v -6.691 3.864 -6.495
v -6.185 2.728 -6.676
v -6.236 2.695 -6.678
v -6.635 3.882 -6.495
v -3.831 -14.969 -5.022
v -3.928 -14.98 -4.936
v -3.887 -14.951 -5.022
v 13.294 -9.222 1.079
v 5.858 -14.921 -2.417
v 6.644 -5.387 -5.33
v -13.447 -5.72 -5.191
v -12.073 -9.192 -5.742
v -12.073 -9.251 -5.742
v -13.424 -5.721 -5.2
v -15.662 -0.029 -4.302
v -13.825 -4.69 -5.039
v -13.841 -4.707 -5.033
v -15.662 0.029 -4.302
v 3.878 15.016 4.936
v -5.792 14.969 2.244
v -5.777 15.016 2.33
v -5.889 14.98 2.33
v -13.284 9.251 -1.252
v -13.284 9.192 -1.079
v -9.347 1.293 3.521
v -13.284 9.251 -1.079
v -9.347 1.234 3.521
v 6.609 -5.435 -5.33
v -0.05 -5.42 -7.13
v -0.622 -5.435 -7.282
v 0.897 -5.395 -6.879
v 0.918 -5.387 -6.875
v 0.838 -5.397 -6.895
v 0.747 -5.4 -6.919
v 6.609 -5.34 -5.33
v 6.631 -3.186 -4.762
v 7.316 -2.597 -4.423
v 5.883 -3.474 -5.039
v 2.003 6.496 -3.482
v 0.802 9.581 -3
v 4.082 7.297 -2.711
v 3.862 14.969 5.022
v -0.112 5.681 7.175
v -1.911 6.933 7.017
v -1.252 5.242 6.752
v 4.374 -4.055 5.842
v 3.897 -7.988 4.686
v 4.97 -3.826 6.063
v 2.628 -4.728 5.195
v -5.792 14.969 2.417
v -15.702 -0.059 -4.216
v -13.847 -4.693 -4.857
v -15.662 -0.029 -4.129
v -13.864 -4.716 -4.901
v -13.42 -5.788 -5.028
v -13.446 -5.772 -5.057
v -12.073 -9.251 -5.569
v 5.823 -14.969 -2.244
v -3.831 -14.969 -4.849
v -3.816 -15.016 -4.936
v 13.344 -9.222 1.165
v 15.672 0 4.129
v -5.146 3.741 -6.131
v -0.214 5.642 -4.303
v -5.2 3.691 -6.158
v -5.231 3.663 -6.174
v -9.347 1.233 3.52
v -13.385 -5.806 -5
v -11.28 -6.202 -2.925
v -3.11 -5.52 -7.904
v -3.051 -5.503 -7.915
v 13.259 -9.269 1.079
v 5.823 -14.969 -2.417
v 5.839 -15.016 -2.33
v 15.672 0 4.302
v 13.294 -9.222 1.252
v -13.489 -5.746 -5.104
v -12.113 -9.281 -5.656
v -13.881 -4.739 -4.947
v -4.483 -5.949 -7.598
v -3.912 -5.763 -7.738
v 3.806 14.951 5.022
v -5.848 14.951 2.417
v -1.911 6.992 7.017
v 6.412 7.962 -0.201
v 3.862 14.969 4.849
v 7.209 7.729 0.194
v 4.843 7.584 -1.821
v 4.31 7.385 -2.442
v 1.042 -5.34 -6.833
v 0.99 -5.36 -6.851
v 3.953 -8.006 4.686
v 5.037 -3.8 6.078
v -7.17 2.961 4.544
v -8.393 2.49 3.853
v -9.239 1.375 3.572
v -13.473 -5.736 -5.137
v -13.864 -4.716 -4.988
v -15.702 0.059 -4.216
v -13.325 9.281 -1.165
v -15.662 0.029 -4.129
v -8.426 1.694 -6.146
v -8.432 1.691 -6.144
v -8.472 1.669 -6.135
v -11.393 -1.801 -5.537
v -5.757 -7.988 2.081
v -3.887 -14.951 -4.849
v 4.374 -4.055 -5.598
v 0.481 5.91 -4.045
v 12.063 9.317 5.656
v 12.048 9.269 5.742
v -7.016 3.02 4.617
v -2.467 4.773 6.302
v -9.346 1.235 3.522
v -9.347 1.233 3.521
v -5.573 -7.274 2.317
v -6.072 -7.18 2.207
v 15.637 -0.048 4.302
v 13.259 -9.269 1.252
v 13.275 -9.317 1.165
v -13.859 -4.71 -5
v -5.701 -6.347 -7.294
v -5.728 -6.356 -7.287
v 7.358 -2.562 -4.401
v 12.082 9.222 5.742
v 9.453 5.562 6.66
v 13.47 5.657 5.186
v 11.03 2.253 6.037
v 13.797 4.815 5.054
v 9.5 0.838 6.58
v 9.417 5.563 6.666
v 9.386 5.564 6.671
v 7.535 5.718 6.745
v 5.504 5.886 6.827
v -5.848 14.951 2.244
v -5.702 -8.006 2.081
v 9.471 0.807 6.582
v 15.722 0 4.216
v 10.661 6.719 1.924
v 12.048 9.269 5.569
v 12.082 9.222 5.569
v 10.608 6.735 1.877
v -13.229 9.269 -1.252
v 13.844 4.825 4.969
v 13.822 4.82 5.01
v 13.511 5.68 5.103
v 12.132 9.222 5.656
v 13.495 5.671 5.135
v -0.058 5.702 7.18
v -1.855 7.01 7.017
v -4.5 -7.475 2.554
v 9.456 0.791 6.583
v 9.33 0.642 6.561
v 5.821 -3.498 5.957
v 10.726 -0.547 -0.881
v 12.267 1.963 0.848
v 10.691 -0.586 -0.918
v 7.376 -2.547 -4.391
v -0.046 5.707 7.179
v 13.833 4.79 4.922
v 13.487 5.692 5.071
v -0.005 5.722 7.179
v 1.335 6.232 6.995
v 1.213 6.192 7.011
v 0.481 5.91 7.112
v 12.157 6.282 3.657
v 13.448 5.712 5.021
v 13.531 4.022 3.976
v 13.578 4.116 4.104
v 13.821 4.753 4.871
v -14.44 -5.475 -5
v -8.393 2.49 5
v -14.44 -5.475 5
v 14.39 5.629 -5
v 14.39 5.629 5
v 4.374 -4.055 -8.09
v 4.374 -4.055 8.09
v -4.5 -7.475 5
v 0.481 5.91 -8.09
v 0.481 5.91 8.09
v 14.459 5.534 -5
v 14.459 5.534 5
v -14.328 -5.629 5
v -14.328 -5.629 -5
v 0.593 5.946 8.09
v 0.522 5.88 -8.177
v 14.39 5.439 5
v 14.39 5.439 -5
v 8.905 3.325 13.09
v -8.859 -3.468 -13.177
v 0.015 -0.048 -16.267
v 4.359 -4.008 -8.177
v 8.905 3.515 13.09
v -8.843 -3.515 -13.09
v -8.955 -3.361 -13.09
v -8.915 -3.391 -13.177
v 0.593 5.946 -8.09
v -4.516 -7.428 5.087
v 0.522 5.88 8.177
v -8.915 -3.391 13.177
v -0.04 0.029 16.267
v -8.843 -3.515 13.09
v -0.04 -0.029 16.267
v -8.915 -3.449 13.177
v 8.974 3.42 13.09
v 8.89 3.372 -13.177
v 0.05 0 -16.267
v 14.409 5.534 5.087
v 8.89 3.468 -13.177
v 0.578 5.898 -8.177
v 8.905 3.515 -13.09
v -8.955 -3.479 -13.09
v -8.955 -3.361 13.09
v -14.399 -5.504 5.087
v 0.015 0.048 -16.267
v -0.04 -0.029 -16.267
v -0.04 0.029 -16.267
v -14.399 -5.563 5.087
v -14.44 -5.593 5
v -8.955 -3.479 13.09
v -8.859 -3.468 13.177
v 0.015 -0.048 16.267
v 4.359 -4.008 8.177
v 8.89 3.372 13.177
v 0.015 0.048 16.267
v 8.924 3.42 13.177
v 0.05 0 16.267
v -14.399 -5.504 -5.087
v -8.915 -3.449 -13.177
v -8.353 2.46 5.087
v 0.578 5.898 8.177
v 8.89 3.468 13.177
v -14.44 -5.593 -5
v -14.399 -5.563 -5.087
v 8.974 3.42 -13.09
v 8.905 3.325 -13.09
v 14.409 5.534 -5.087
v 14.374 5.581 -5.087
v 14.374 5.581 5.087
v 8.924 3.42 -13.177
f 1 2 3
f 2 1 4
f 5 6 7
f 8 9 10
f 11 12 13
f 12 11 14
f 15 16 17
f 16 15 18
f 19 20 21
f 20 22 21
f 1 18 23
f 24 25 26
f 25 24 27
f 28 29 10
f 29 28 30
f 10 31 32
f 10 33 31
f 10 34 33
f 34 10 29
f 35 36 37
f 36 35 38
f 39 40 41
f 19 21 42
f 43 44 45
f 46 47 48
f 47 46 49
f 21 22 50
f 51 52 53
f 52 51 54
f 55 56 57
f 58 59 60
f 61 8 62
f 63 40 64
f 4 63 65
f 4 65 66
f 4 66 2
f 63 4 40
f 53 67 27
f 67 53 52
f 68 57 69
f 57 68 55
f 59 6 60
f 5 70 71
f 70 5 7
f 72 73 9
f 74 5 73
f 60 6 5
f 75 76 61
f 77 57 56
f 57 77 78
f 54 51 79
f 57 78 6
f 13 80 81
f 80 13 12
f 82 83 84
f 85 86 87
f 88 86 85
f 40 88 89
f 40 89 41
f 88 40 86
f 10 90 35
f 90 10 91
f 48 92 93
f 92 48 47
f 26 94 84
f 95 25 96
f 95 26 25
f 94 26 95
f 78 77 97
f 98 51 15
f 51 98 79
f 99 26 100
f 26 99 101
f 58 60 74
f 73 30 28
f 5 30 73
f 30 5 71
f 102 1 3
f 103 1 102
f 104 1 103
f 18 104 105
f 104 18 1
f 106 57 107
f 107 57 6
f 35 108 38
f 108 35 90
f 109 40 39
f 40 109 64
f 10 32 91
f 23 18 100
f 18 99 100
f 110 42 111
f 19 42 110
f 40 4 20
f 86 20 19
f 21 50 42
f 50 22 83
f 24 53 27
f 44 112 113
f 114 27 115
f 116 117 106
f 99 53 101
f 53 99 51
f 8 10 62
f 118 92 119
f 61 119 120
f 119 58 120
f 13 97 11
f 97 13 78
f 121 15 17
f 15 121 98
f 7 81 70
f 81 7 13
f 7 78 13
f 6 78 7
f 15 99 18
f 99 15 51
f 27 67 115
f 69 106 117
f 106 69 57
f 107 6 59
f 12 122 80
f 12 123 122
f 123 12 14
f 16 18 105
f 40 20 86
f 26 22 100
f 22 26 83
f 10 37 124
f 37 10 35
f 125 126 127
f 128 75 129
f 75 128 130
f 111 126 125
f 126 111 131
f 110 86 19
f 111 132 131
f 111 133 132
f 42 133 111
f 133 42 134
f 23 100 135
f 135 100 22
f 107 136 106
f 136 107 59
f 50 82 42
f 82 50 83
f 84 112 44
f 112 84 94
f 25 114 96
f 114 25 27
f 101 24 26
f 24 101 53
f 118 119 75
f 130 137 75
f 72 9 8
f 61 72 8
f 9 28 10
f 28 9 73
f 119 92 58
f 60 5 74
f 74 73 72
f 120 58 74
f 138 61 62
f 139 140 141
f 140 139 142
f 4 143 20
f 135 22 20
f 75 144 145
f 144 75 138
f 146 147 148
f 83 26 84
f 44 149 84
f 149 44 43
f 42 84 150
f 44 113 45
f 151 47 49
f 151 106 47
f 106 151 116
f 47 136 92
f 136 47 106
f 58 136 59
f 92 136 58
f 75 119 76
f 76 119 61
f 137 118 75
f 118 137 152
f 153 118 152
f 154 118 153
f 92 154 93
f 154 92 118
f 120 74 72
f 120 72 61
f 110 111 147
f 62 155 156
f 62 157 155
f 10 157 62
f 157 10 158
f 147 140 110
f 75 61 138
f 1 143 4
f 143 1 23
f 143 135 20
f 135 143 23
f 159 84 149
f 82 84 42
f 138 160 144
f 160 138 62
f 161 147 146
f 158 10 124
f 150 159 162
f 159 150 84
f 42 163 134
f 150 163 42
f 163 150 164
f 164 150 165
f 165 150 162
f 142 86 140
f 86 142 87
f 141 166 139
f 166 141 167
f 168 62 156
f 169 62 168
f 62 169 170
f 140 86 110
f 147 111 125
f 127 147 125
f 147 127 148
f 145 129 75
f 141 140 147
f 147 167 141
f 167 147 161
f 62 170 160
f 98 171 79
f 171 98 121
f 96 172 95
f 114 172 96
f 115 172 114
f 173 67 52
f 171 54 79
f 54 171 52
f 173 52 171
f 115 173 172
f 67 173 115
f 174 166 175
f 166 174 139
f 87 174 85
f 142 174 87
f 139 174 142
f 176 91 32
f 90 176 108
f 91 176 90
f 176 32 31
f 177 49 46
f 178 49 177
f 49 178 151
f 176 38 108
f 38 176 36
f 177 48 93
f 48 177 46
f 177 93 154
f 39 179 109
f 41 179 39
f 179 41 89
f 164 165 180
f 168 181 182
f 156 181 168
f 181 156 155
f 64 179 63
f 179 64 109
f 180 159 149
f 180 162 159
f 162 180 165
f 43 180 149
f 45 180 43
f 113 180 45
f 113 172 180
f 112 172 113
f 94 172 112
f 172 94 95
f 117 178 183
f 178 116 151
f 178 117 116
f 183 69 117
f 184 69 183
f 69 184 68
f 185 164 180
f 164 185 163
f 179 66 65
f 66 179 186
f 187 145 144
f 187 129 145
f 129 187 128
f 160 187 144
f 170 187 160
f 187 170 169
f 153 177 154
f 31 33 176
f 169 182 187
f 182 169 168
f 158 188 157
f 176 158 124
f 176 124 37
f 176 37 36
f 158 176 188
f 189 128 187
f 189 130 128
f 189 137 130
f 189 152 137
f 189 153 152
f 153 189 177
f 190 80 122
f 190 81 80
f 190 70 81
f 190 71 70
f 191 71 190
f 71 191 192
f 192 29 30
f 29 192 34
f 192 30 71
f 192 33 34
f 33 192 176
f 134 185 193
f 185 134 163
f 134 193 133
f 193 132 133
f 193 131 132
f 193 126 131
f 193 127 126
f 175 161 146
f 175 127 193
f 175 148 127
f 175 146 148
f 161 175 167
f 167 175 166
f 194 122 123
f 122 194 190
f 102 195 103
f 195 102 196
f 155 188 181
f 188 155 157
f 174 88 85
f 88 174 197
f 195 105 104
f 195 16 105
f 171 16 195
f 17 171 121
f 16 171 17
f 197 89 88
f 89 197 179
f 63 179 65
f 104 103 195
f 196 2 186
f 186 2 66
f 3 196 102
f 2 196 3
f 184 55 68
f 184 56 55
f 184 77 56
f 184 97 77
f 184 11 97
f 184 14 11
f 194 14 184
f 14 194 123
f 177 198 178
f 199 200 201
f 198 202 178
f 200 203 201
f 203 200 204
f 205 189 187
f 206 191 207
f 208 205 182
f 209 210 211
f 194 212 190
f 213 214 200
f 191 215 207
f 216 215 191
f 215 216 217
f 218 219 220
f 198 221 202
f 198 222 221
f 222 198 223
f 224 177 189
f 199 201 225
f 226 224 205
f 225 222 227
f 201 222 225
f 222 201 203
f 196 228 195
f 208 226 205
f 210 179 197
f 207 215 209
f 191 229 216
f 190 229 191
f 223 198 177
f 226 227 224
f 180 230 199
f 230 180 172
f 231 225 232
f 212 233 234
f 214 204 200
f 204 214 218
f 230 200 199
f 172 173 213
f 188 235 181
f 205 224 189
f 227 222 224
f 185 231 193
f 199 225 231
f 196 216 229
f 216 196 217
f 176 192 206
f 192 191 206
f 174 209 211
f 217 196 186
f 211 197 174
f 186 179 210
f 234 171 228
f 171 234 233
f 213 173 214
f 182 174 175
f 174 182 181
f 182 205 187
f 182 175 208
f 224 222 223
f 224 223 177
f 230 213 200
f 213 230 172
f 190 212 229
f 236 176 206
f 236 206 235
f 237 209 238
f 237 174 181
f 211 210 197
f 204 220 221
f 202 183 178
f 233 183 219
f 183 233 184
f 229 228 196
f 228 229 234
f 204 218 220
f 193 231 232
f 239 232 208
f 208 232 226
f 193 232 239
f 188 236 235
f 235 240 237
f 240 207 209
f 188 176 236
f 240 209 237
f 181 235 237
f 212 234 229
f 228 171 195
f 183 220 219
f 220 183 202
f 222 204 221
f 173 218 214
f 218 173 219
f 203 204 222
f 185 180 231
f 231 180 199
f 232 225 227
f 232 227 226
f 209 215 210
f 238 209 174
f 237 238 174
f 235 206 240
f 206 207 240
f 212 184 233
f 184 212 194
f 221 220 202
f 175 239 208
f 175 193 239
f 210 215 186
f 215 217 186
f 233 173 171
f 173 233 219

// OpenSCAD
// Auto-generated OpenSCAD file

    inner_points = 10*[[1.4359011870482463, 0.5533730837177137, -0.5000000000000805], [-1.4359011870482463, -0.5533730837177137, 0.5000000000000805], [0.8874357380822848, 0.34200337419673843, 1.3090169943748977], [1.483420692140161e-13, -1.4966410443445797e-13, 1.618033988749895], [-1.483420692140161e-13, 1.4966410443445797e-13, -1.618033988749895], [-0.8874357380822848, -0.34200337419673843, -1.3090169943748977], [1.4359011870483378, 0.5533730837176212, 0.4999999999999195], [-0.887435738082045, -0.3420033741969806, 1.3090169943749972], [0.887435738082045, 0.3420033741969806, -1.3090169943749972], [-1.4359011870483378, -0.5533730837176212, -0.4999999999999195], [0.05622638989055023, 0.5850898186537883, 0.8090169943749964], [0.434336020988879, -0.39603500310477363, 0.809016994374871], [0.6046918388566034, 0.7964595281746711, 1.8207657603852567e-14], [0.9828014699549321, -0.18466529358389083, -1.0721978860317449e-13], [-0.8312093481916429, 0.2430864444569574, 0.5000000000000987], [-0.45309971709331415, -0.7380383773016045, 0.49999999999997324], [0.05622638989040191, 0.5850898186539379, -0.8090169943748985], [0.4343360209887307, -0.3960350031046239, -0.809016994375024], [-0.8312093481917346, 0.24308644445704983, -0.4999999999999013], [-0.4530997170934058, -0.738038377301512, -0.5000000000000268]];

    outer_points = 10*[[-1.562151832989105, 0.0, -0.42156332791014234], [1.562151832989105, 0.0, 0.42156332791014234], [-0.5807729208038567, 1.4921233423461835, 0.23303376243906446], [0.3846900075713595, 1.4921233423461835, 0.4935742274980496], [-0.3846900075713595, -1.4921233423461835, -0.4935742274980496], [0.5807729208038567, -1.4921233423461835, -0.23303376243906446], [-1.3244003331775505, 0.9221829409770366, -0.11651767934537474], [1.2032144281867707, 0.9221829409770366, 0.5655861136237528], [-1.2032144281867707, -0.9221829409770366, -0.5655861136237528], [1.3244003331775505, -0.9221829409770366, 0.11651767934537474], [-0.18701174725268985, 0.6962659651294776, 0.692993731711776], [0.07861977866300407, 0.9533850298427866, -0.29133471347343615], [-0.9306391596263837, 0.12632556376033077, 0.34344228992733694], [-0.6650076337106898, 0.3834446284736398, -0.6408861552578753], [0.6315126733627214, 0.12632556376033077, 0.7650056178374792], [0.8971441992784153, 0.3834446284736398, -0.21932282734773292], [-0.5717017548240494, -0.7958573772167059, 0.19941950421372653], [-0.3060702289083555, -0.5387383125033969, -0.7849089409714857], [0.3937611735511668, -0.7958573772167059, 0.45995996927271166], [0.6593926994668606, -0.5387383125033969, -0.5243684759125006]];

    // Convex hull for inner set (I)
    module inner_hull() {
        hull() {
            for (p = inner_points) {
                translate(p) sphere(r=0.1);
            }
        }
    }

    // Convex hull for outer set (O) minus inner hull (O \ I)
    module outer_minus_inner() {
        difference() {
            hull() {
                for (p = outer_points) {
                    translate(p) sphere(r=0.1);
                }
            }
            inner_hull(); // Subtract inner hull
        }
    }

    // Convex hull for outer set (O) minus all translated inner hulls
    module outer_minus_AllTranslationInner() {
        difference() {
            hull() {
                for (p = outer_points) {
                    translate(p) sphere(r=0.1);
                }
            }
            hull() {
                translate([0,0,50]) inner_hull();
                translate([0,0,-50]) inner_hull();
            }; // Subtract translated inner hulls
        }
    }

    // Difference between outer_minus_inner and outer_minus_AllTranslationInner
    module outer_minus_inner_diff() {
        difference() {
            // Outer minus inner
            difference() {
                hull() {
                    for (p = outer_points) {
                        translate(p) sphere(r=0.1);
                    }
                }
                inner_hull();
            }

            // Subtract Outer minus AllTranslationInner
            difference() {
                hull() {
                    for (p = outer_points) {
                        translate(p) sphere(r=0.1);
                    }
                }
                hull() {
                    translate([0,0,50]) inner_hull();
                    translate([0,0,-50]) inner_hull();
                };
            }
        }
    }

    // Rendering all with colors applied
    color([1, 0, 0, 0.5]) inner_hull(); // Transparent red
    color([0, 1, 0, 1]) outer_minus_AllTranslationInner(); // Opaque green
    color([1, 1, 0, 1]) outer_minus_inner_diff(); // Opaque yellow
    
